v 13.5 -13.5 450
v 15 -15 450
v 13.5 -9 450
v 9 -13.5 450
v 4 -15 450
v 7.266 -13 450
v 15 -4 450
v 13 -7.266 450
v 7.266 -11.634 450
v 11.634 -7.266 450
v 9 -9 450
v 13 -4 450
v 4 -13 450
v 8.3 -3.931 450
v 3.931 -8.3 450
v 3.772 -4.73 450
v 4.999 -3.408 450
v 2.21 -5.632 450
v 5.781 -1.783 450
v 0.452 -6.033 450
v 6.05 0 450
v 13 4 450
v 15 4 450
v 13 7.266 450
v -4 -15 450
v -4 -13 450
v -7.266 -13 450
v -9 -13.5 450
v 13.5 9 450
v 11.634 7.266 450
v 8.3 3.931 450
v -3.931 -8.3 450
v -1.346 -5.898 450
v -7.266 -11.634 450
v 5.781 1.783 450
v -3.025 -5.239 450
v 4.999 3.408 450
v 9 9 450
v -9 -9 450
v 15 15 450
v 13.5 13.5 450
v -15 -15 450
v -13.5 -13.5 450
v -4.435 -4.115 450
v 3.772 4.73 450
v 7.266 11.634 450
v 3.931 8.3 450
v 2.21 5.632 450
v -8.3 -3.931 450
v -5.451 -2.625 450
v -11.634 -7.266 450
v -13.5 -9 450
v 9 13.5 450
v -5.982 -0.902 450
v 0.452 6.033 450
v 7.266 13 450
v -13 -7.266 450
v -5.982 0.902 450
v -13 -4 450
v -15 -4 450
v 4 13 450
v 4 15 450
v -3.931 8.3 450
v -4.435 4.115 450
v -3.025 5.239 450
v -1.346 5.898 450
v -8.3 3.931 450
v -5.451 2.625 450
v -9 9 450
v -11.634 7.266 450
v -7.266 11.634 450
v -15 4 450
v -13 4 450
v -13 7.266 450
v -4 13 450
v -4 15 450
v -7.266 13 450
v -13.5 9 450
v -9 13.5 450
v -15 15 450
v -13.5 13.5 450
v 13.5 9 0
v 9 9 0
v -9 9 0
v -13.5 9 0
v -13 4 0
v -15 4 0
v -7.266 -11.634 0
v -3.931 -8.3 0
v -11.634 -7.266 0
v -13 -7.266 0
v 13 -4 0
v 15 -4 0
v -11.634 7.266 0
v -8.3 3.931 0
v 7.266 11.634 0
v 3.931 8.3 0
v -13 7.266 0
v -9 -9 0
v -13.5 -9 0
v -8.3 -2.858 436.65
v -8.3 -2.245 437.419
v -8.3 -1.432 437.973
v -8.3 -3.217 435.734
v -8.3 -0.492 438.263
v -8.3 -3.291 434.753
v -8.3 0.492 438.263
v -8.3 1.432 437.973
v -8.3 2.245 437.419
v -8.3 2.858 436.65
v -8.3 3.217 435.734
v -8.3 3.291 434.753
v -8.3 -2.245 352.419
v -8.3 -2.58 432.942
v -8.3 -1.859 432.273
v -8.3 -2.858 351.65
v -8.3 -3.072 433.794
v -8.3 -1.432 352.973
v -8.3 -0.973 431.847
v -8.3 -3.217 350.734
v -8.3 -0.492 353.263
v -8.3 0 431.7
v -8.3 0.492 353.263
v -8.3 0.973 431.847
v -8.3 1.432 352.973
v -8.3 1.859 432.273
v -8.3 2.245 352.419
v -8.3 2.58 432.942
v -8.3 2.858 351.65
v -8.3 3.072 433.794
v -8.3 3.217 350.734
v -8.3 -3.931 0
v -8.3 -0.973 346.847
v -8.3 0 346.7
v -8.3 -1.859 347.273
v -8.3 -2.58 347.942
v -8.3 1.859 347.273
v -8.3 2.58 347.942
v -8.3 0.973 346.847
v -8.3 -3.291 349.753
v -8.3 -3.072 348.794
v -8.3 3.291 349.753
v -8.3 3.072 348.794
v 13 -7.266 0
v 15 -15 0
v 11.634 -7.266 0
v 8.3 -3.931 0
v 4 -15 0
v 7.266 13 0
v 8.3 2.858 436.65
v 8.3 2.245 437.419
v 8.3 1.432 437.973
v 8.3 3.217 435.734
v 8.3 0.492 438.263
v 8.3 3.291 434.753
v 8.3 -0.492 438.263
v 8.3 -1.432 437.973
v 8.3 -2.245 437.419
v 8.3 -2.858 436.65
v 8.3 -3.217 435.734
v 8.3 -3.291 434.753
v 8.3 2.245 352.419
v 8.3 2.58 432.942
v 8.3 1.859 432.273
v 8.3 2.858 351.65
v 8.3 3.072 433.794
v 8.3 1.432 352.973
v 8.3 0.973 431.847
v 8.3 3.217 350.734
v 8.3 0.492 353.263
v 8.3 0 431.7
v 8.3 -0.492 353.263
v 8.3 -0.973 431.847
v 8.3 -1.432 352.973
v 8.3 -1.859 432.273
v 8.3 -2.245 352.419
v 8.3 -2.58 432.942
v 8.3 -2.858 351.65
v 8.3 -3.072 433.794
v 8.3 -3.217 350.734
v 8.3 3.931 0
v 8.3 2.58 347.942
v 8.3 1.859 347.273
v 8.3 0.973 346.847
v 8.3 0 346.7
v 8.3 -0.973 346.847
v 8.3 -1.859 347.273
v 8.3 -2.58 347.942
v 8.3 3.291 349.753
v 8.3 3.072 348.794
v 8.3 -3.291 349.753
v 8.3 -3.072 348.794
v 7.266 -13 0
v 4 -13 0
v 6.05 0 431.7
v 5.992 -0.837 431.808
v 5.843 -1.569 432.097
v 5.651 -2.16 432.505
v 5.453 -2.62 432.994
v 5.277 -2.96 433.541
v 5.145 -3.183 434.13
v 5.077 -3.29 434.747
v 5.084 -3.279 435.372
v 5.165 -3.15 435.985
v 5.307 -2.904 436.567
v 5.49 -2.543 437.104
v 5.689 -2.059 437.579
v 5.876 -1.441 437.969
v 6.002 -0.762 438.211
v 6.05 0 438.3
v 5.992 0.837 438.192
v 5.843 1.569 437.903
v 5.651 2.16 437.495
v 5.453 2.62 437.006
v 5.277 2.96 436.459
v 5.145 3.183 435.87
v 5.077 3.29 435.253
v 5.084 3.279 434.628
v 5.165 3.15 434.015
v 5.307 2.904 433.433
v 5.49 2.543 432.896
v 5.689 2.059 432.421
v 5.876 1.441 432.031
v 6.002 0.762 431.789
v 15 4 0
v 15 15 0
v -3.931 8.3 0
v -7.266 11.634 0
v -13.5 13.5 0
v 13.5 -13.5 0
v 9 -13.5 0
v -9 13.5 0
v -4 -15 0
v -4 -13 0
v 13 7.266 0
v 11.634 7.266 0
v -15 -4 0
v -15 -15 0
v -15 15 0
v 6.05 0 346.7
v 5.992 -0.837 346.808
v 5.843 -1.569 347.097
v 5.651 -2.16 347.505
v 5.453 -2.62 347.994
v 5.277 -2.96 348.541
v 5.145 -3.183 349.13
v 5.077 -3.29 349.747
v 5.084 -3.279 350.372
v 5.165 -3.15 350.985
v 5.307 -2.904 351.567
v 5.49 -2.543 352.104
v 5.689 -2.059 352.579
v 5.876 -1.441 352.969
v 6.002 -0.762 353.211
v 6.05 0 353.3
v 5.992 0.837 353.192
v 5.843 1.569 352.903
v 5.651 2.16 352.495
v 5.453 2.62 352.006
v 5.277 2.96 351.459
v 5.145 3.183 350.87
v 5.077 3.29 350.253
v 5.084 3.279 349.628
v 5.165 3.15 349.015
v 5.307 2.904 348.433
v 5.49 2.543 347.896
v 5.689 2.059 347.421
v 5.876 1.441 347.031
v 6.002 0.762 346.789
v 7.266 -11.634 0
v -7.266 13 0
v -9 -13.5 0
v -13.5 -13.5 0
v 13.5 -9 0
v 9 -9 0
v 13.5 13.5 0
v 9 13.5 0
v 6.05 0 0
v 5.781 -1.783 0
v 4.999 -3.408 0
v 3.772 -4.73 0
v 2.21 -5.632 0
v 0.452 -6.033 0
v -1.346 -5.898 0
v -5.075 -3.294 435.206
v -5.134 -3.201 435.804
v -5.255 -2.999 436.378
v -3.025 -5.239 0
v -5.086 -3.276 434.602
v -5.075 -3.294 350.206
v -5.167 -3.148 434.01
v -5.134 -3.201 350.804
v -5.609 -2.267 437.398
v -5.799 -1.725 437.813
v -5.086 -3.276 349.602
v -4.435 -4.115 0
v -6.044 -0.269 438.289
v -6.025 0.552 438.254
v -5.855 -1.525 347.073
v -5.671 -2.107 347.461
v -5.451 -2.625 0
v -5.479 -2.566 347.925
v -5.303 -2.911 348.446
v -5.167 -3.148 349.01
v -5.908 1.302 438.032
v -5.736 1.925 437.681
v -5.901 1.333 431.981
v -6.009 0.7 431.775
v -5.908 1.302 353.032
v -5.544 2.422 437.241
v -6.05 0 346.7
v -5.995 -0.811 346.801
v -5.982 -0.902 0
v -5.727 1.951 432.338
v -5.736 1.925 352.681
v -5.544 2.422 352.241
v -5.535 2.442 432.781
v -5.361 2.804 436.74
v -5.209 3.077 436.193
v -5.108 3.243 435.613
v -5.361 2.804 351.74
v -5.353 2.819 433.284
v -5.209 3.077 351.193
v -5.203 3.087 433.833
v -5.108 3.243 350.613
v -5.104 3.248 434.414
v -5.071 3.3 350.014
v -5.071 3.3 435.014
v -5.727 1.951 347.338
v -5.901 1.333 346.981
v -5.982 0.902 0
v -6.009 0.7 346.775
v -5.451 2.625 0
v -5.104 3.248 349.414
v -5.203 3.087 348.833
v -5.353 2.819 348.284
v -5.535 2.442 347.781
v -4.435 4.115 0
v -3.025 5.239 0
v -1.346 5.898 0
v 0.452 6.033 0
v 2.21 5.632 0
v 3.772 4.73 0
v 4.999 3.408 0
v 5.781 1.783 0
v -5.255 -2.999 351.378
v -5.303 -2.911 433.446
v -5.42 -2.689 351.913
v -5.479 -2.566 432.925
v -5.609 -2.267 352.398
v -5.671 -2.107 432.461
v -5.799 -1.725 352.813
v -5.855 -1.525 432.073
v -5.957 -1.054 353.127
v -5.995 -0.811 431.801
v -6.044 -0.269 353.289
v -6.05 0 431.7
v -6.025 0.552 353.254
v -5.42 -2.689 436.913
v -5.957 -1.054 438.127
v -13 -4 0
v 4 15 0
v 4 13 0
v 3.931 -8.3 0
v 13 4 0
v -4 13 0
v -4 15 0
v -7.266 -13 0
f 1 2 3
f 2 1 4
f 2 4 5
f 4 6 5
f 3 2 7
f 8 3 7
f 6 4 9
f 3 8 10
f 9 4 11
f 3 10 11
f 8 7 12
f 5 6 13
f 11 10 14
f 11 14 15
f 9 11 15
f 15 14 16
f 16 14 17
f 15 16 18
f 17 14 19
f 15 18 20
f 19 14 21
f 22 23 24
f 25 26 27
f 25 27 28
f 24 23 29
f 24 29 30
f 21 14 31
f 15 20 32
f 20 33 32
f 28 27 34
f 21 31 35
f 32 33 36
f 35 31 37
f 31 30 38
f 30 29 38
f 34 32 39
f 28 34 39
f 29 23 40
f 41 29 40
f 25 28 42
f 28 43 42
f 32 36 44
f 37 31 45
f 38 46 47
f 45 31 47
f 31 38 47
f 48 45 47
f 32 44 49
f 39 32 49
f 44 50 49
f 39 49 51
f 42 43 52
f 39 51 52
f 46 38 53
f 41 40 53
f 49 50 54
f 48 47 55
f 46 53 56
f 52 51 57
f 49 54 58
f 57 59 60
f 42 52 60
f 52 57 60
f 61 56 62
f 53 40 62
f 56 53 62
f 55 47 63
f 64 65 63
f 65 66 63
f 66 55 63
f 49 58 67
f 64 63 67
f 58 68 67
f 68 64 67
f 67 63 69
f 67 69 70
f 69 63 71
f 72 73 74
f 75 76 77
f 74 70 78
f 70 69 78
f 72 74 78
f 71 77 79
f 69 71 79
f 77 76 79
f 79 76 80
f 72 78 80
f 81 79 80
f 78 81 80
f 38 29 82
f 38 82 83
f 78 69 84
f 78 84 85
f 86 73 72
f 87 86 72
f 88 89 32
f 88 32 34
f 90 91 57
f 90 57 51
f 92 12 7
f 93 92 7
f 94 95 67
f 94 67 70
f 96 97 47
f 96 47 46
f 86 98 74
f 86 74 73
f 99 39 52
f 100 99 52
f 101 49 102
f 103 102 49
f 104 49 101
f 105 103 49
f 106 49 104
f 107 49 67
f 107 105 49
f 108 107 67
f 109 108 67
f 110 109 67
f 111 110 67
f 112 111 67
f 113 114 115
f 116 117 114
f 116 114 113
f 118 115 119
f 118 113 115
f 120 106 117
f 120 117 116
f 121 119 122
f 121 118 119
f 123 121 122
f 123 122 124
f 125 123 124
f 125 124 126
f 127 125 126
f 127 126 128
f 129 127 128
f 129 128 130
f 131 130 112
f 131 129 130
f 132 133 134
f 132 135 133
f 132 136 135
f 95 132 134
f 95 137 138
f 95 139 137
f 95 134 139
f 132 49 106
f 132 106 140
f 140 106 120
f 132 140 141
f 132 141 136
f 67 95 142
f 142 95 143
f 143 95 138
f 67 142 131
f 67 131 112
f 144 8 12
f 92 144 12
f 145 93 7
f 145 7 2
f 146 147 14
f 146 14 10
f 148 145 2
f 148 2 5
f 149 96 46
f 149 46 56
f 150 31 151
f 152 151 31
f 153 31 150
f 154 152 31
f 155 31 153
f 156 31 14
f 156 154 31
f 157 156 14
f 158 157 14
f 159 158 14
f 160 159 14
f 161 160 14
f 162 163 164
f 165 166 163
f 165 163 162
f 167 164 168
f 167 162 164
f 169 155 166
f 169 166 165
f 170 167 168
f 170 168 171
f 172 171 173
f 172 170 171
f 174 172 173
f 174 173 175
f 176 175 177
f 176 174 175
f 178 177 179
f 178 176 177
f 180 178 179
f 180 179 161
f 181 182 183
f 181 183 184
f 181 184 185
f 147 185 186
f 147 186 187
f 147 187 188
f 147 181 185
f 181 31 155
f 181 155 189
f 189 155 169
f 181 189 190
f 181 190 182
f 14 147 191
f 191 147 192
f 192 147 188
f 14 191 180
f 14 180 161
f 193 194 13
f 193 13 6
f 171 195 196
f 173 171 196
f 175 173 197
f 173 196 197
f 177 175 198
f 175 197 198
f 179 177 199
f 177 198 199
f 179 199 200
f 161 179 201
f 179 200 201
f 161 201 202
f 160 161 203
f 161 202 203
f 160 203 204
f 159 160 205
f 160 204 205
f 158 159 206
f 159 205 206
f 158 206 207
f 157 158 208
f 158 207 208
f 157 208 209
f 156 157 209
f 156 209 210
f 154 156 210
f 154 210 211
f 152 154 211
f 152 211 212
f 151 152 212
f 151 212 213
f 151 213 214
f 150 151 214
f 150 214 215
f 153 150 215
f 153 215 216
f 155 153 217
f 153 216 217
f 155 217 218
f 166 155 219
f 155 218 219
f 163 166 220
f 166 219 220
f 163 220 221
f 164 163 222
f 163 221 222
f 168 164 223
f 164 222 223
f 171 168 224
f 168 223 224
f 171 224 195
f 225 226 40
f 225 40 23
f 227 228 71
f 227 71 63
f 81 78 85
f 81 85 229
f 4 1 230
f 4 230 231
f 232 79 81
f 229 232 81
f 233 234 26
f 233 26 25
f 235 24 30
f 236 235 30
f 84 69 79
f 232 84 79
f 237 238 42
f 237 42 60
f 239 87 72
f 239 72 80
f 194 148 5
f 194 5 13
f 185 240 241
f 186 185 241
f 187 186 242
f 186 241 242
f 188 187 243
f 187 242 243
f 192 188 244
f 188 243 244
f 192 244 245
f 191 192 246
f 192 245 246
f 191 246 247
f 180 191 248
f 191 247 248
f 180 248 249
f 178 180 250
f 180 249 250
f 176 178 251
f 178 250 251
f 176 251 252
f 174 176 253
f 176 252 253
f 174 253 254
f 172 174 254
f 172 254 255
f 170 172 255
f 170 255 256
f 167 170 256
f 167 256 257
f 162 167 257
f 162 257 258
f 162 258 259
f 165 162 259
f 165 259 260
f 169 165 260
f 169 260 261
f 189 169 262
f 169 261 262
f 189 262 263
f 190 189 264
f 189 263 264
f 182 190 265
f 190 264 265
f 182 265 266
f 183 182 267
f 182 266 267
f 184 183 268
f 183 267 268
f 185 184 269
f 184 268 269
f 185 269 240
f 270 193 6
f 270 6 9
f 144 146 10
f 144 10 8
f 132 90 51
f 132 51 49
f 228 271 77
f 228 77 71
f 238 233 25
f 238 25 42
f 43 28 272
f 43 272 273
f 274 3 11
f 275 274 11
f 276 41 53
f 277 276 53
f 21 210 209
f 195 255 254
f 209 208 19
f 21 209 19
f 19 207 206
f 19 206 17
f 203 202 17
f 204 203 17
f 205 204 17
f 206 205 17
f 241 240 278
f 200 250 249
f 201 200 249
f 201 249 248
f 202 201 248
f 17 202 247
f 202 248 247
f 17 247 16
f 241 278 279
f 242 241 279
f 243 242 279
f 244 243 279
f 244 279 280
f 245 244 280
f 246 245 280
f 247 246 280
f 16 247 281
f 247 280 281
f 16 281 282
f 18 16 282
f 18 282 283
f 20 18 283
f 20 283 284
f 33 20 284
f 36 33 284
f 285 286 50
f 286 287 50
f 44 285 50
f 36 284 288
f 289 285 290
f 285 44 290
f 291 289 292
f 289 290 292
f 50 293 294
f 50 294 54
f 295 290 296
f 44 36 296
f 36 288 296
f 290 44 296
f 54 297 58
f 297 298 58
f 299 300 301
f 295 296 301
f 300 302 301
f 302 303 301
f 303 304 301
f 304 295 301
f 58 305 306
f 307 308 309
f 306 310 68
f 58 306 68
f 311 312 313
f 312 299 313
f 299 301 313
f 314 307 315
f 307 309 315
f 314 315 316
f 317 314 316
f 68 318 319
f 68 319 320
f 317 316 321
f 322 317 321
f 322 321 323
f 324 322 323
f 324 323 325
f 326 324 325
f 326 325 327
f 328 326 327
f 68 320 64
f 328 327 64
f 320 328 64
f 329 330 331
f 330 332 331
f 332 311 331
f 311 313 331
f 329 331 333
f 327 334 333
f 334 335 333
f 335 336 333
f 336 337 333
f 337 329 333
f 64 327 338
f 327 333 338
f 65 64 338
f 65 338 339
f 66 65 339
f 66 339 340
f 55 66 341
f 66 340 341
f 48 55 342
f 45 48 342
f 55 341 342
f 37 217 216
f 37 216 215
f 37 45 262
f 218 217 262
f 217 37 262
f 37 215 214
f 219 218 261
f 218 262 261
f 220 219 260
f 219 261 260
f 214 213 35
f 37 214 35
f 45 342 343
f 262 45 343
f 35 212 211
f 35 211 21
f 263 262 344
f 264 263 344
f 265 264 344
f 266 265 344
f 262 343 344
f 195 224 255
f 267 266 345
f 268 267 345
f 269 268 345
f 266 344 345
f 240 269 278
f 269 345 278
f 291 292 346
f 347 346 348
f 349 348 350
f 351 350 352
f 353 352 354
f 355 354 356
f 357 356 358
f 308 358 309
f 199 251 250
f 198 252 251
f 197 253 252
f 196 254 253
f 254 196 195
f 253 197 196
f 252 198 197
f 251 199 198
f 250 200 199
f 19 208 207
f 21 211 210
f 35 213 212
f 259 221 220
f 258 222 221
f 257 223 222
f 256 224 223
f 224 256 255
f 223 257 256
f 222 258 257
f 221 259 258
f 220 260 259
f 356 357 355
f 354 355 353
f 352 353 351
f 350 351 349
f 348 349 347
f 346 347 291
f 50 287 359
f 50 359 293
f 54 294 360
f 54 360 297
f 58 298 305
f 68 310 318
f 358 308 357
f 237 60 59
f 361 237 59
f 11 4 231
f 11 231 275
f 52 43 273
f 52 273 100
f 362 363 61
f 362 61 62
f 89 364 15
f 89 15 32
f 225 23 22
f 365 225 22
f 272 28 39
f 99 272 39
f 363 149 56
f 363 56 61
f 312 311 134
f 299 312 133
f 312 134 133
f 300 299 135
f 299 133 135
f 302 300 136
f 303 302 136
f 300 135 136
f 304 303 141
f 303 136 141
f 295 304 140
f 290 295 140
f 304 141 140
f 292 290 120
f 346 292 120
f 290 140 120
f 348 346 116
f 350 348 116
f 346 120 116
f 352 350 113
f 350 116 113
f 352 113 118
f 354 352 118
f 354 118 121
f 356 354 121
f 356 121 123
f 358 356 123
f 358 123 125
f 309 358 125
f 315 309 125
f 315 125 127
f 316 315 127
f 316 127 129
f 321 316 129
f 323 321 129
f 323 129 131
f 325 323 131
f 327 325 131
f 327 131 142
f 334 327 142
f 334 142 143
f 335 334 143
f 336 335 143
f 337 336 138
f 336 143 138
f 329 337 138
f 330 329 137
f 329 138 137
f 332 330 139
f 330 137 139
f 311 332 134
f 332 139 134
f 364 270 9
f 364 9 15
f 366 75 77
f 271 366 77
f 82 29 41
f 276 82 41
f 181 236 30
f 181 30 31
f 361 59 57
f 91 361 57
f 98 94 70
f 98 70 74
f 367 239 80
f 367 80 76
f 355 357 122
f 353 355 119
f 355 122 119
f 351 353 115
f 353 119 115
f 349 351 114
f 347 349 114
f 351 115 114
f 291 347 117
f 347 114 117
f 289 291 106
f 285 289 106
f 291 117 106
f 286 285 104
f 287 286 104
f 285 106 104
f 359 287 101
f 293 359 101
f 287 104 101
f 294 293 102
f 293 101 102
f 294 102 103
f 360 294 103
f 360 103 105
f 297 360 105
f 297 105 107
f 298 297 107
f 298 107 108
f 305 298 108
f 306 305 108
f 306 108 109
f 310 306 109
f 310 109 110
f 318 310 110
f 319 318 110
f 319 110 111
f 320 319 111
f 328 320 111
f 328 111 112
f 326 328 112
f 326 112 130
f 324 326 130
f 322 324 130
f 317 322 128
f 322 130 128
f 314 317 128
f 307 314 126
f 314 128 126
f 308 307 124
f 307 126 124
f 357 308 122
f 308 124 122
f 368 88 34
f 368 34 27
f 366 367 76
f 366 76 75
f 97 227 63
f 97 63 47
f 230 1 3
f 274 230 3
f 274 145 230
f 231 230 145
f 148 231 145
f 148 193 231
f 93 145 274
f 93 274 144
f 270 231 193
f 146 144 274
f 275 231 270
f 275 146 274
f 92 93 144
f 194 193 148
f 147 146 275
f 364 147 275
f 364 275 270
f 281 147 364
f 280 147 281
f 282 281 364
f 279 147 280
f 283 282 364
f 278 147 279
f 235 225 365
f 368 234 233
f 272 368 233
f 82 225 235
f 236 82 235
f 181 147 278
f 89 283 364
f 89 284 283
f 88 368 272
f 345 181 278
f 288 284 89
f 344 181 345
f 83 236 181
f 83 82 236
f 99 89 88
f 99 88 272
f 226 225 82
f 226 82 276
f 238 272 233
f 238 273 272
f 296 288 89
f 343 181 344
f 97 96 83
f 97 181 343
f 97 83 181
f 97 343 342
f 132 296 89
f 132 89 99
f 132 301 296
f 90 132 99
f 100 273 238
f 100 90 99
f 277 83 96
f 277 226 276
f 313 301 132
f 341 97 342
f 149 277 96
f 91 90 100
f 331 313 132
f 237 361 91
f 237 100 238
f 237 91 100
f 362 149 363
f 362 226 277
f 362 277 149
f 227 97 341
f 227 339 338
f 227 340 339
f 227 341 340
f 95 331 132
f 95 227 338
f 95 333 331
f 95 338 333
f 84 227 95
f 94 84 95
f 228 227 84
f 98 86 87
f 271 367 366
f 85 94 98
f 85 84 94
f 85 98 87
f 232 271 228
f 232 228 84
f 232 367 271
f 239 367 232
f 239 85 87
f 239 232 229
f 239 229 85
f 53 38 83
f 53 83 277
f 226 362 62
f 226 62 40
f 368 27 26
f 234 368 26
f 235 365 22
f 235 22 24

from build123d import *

# Parameters (mm, degrees)
SKIZZE1_R                       = 6.05
SKIZZE1_W                       = 4.5
SKIZZE1_H                       = 4.5
AUFSATZ_LINEAR_AUSTRAGEN1_DEPTH = 450
SKIZZE3_R                       = 3.3
SCHNITT_LINEAR_AUSTRAGEN2_DEPTH = 452.248268785


with BuildPart() as part:
    # Skizze1 → Aufsatz-Linear austragen1 (new body)
    with BuildSketch(Plane(origin=(0, 0, 0), x_dir=(-1, 0, 0), z_dir=(0, 0, -1))):
        Polygon((15.000004175, -14.999997298), (15.000004175, -3.999997298), (13.000004175, -3.999997298), (13.000004175, -7.265682298), (11.634319175, -7.265682298), (8.300003831, -3.931367382), (8.300003831, 3.931374091), (11.634315, 7.265685), (13.000004175, 7.265685), (13.000004175, 4.000002702), (15.000004175, 4.000002702), (15.000004175, 15.000002702), (4.000004175, 15.000002702), (4.000004175, 13.000002962), (7.265688438, 13.000002962), (7.265688438, 11.634318438), (3.931373306, 8.300003046), (-3.931368167, 8.300003046), (-7.265683511, 11.634317962), (-7.265683511, 13.000002962), (-3.999995825, 13.000002962), (-3.999995825, 15.000002702), (-14.999995825, 15.000002702), (-14.999995825, 4.000002702), (-12.999995825, 4.000002702), (-12.999995825, 7.265685), (-11.634315, 7.265685), (-8.3, 3.931371213), (-8.3, -3.931371213), (-11.634310825, -7.265682298), (-12.999995825, -7.265682298), (-12.999995825, -3.999997298), (-14.999995825, -3.999997298), (-14.999995825, -14.999997298), (-3.999995825, -14.999997298), (-3.999995825, -12.999997038), (-7.265683511, -12.999997038), (-7.265683511, -11.634312038), (-3.931368988, -8.299997775), (3.931373438, -8.299997775), (7.265688438, -11.634311562), (7.265688438, -12.999997038), (4.000004175, -12.999997038), (4.000004175, -14.999997298), align=None)
        with Locations(Location((0, 0, 0), (0, 0, 180))):
            Circle(SKIZZE1_R, mode=Mode.SUBTRACT)
        with Locations((11.25, 11.25)):
            Rectangle(SKIZZE1_W, SKIZZE1_H, mode=Mode.SUBTRACT)
        with Locations((11.25, -11.25)):
            Rectangle(SKIZZE1_W, SKIZZE1_H, mode=Mode.SUBTRACT)
        with Locations((-11.25, -11.25)):
            Rectangle(SKIZZE1_W, SKIZZE1_H, mode=Mode.SUBTRACT)
        with Locations((-11.25, 11.25)):
            Rectangle(SKIZZE1_W, SKIZZE1_H, mode=Mode.SUBTRACT)
    extrude(amount=-AUFSATZ_LINEAR_AUSTRAGEN1_DEPTH)

    # Skizze3 → Schnitt-Linear austragen2 (cut, through all)
    with BuildSketch(Plane.ZY.offset(15.000004175)):
        with Locations(Location((435, 0, 0), (0, 0, 180))):
            Circle(SKIZZE3_R)
        with Locations(Location((350, 0, 0), (0, 0, 180))):
            Circle(SKIZZE3_R)
    extrude(amount=-SCHNITT_LINEAR_AUSTRAGEN2_DEPTH, mode=Mode.SUBTRACT)


solid = part.part
